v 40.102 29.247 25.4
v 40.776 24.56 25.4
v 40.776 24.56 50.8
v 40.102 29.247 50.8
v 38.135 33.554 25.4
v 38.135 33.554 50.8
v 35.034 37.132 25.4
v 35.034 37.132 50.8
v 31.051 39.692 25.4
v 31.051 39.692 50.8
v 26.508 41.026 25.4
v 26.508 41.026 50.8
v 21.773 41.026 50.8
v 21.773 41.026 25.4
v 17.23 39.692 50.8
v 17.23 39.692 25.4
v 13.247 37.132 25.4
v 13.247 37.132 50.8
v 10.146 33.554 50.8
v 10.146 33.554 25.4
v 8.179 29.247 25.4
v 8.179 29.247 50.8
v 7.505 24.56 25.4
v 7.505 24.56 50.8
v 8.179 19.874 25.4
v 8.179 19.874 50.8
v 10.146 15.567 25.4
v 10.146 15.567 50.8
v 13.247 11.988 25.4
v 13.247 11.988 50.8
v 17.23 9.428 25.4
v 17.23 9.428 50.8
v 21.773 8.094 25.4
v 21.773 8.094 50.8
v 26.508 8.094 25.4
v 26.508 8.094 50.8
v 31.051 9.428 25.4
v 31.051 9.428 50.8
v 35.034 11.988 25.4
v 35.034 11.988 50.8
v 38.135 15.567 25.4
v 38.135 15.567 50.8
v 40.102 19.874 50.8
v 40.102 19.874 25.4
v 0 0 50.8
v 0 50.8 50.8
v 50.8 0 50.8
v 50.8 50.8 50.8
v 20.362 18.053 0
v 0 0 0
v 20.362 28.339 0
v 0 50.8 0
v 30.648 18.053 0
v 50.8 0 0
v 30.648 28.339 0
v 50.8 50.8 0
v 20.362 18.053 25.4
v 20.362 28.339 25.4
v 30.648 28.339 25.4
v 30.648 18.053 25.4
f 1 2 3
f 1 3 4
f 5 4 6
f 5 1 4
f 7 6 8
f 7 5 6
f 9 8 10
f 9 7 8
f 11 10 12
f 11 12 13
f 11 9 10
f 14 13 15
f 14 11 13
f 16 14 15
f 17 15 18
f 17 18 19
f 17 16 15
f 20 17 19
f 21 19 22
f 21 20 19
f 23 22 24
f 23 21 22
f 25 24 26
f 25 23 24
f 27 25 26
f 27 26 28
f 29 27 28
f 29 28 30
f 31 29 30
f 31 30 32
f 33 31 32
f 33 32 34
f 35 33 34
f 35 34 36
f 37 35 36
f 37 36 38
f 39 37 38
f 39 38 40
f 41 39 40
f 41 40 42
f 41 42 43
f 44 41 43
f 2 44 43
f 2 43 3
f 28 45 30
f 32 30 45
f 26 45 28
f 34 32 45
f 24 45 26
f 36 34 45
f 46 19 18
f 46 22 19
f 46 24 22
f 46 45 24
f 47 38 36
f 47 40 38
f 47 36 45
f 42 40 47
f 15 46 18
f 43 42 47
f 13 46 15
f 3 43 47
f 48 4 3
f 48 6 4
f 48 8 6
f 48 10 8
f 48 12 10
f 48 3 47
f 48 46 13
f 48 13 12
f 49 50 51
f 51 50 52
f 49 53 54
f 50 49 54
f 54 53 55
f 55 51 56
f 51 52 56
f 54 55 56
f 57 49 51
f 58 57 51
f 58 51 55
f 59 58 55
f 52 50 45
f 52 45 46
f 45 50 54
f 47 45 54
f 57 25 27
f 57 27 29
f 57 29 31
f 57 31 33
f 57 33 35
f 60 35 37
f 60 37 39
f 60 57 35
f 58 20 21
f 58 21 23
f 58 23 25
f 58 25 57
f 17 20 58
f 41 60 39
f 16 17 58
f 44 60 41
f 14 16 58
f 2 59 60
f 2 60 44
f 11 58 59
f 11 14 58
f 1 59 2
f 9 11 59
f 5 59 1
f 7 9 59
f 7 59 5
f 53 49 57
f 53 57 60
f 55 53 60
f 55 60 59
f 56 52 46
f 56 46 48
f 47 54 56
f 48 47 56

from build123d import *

# Parameters (mm, degrees)
F0_R     = 16.635209
F0_W     = 10.285949
F0_H     = 10.285953
F1_DEPTH = 25.4
F0_W_2   = 50.8
F0_H_2   = 50.8
F2_DEPTH = 50.8


with BuildPart() as f1:
    # F0 (on Top) → F1 (new body)
    with BuildSketch(Plane.XY):
        with Locations((24.140496, 24.560331)):
            Circle(F0_R)
        with Locations((25.504959, 23.19587)):
            Rectangle(F0_W, F0_H, mode=Mode.SUBTRACT)
    extrude(amount=F1_DEPTH)

    # F0 (on Top) → F2 (join)
    with BuildSketch(Plane.XY):
        with Locations((25.4, 25.4)):
            Rectangle(F0_W_2, F0_H_2)
        with Locations((24.140496, 24.560331)):
            Circle(F0_R, mode=Mode.SUBTRACT)
    extrude(amount=F2_DEPTH)


solid = f1.part
